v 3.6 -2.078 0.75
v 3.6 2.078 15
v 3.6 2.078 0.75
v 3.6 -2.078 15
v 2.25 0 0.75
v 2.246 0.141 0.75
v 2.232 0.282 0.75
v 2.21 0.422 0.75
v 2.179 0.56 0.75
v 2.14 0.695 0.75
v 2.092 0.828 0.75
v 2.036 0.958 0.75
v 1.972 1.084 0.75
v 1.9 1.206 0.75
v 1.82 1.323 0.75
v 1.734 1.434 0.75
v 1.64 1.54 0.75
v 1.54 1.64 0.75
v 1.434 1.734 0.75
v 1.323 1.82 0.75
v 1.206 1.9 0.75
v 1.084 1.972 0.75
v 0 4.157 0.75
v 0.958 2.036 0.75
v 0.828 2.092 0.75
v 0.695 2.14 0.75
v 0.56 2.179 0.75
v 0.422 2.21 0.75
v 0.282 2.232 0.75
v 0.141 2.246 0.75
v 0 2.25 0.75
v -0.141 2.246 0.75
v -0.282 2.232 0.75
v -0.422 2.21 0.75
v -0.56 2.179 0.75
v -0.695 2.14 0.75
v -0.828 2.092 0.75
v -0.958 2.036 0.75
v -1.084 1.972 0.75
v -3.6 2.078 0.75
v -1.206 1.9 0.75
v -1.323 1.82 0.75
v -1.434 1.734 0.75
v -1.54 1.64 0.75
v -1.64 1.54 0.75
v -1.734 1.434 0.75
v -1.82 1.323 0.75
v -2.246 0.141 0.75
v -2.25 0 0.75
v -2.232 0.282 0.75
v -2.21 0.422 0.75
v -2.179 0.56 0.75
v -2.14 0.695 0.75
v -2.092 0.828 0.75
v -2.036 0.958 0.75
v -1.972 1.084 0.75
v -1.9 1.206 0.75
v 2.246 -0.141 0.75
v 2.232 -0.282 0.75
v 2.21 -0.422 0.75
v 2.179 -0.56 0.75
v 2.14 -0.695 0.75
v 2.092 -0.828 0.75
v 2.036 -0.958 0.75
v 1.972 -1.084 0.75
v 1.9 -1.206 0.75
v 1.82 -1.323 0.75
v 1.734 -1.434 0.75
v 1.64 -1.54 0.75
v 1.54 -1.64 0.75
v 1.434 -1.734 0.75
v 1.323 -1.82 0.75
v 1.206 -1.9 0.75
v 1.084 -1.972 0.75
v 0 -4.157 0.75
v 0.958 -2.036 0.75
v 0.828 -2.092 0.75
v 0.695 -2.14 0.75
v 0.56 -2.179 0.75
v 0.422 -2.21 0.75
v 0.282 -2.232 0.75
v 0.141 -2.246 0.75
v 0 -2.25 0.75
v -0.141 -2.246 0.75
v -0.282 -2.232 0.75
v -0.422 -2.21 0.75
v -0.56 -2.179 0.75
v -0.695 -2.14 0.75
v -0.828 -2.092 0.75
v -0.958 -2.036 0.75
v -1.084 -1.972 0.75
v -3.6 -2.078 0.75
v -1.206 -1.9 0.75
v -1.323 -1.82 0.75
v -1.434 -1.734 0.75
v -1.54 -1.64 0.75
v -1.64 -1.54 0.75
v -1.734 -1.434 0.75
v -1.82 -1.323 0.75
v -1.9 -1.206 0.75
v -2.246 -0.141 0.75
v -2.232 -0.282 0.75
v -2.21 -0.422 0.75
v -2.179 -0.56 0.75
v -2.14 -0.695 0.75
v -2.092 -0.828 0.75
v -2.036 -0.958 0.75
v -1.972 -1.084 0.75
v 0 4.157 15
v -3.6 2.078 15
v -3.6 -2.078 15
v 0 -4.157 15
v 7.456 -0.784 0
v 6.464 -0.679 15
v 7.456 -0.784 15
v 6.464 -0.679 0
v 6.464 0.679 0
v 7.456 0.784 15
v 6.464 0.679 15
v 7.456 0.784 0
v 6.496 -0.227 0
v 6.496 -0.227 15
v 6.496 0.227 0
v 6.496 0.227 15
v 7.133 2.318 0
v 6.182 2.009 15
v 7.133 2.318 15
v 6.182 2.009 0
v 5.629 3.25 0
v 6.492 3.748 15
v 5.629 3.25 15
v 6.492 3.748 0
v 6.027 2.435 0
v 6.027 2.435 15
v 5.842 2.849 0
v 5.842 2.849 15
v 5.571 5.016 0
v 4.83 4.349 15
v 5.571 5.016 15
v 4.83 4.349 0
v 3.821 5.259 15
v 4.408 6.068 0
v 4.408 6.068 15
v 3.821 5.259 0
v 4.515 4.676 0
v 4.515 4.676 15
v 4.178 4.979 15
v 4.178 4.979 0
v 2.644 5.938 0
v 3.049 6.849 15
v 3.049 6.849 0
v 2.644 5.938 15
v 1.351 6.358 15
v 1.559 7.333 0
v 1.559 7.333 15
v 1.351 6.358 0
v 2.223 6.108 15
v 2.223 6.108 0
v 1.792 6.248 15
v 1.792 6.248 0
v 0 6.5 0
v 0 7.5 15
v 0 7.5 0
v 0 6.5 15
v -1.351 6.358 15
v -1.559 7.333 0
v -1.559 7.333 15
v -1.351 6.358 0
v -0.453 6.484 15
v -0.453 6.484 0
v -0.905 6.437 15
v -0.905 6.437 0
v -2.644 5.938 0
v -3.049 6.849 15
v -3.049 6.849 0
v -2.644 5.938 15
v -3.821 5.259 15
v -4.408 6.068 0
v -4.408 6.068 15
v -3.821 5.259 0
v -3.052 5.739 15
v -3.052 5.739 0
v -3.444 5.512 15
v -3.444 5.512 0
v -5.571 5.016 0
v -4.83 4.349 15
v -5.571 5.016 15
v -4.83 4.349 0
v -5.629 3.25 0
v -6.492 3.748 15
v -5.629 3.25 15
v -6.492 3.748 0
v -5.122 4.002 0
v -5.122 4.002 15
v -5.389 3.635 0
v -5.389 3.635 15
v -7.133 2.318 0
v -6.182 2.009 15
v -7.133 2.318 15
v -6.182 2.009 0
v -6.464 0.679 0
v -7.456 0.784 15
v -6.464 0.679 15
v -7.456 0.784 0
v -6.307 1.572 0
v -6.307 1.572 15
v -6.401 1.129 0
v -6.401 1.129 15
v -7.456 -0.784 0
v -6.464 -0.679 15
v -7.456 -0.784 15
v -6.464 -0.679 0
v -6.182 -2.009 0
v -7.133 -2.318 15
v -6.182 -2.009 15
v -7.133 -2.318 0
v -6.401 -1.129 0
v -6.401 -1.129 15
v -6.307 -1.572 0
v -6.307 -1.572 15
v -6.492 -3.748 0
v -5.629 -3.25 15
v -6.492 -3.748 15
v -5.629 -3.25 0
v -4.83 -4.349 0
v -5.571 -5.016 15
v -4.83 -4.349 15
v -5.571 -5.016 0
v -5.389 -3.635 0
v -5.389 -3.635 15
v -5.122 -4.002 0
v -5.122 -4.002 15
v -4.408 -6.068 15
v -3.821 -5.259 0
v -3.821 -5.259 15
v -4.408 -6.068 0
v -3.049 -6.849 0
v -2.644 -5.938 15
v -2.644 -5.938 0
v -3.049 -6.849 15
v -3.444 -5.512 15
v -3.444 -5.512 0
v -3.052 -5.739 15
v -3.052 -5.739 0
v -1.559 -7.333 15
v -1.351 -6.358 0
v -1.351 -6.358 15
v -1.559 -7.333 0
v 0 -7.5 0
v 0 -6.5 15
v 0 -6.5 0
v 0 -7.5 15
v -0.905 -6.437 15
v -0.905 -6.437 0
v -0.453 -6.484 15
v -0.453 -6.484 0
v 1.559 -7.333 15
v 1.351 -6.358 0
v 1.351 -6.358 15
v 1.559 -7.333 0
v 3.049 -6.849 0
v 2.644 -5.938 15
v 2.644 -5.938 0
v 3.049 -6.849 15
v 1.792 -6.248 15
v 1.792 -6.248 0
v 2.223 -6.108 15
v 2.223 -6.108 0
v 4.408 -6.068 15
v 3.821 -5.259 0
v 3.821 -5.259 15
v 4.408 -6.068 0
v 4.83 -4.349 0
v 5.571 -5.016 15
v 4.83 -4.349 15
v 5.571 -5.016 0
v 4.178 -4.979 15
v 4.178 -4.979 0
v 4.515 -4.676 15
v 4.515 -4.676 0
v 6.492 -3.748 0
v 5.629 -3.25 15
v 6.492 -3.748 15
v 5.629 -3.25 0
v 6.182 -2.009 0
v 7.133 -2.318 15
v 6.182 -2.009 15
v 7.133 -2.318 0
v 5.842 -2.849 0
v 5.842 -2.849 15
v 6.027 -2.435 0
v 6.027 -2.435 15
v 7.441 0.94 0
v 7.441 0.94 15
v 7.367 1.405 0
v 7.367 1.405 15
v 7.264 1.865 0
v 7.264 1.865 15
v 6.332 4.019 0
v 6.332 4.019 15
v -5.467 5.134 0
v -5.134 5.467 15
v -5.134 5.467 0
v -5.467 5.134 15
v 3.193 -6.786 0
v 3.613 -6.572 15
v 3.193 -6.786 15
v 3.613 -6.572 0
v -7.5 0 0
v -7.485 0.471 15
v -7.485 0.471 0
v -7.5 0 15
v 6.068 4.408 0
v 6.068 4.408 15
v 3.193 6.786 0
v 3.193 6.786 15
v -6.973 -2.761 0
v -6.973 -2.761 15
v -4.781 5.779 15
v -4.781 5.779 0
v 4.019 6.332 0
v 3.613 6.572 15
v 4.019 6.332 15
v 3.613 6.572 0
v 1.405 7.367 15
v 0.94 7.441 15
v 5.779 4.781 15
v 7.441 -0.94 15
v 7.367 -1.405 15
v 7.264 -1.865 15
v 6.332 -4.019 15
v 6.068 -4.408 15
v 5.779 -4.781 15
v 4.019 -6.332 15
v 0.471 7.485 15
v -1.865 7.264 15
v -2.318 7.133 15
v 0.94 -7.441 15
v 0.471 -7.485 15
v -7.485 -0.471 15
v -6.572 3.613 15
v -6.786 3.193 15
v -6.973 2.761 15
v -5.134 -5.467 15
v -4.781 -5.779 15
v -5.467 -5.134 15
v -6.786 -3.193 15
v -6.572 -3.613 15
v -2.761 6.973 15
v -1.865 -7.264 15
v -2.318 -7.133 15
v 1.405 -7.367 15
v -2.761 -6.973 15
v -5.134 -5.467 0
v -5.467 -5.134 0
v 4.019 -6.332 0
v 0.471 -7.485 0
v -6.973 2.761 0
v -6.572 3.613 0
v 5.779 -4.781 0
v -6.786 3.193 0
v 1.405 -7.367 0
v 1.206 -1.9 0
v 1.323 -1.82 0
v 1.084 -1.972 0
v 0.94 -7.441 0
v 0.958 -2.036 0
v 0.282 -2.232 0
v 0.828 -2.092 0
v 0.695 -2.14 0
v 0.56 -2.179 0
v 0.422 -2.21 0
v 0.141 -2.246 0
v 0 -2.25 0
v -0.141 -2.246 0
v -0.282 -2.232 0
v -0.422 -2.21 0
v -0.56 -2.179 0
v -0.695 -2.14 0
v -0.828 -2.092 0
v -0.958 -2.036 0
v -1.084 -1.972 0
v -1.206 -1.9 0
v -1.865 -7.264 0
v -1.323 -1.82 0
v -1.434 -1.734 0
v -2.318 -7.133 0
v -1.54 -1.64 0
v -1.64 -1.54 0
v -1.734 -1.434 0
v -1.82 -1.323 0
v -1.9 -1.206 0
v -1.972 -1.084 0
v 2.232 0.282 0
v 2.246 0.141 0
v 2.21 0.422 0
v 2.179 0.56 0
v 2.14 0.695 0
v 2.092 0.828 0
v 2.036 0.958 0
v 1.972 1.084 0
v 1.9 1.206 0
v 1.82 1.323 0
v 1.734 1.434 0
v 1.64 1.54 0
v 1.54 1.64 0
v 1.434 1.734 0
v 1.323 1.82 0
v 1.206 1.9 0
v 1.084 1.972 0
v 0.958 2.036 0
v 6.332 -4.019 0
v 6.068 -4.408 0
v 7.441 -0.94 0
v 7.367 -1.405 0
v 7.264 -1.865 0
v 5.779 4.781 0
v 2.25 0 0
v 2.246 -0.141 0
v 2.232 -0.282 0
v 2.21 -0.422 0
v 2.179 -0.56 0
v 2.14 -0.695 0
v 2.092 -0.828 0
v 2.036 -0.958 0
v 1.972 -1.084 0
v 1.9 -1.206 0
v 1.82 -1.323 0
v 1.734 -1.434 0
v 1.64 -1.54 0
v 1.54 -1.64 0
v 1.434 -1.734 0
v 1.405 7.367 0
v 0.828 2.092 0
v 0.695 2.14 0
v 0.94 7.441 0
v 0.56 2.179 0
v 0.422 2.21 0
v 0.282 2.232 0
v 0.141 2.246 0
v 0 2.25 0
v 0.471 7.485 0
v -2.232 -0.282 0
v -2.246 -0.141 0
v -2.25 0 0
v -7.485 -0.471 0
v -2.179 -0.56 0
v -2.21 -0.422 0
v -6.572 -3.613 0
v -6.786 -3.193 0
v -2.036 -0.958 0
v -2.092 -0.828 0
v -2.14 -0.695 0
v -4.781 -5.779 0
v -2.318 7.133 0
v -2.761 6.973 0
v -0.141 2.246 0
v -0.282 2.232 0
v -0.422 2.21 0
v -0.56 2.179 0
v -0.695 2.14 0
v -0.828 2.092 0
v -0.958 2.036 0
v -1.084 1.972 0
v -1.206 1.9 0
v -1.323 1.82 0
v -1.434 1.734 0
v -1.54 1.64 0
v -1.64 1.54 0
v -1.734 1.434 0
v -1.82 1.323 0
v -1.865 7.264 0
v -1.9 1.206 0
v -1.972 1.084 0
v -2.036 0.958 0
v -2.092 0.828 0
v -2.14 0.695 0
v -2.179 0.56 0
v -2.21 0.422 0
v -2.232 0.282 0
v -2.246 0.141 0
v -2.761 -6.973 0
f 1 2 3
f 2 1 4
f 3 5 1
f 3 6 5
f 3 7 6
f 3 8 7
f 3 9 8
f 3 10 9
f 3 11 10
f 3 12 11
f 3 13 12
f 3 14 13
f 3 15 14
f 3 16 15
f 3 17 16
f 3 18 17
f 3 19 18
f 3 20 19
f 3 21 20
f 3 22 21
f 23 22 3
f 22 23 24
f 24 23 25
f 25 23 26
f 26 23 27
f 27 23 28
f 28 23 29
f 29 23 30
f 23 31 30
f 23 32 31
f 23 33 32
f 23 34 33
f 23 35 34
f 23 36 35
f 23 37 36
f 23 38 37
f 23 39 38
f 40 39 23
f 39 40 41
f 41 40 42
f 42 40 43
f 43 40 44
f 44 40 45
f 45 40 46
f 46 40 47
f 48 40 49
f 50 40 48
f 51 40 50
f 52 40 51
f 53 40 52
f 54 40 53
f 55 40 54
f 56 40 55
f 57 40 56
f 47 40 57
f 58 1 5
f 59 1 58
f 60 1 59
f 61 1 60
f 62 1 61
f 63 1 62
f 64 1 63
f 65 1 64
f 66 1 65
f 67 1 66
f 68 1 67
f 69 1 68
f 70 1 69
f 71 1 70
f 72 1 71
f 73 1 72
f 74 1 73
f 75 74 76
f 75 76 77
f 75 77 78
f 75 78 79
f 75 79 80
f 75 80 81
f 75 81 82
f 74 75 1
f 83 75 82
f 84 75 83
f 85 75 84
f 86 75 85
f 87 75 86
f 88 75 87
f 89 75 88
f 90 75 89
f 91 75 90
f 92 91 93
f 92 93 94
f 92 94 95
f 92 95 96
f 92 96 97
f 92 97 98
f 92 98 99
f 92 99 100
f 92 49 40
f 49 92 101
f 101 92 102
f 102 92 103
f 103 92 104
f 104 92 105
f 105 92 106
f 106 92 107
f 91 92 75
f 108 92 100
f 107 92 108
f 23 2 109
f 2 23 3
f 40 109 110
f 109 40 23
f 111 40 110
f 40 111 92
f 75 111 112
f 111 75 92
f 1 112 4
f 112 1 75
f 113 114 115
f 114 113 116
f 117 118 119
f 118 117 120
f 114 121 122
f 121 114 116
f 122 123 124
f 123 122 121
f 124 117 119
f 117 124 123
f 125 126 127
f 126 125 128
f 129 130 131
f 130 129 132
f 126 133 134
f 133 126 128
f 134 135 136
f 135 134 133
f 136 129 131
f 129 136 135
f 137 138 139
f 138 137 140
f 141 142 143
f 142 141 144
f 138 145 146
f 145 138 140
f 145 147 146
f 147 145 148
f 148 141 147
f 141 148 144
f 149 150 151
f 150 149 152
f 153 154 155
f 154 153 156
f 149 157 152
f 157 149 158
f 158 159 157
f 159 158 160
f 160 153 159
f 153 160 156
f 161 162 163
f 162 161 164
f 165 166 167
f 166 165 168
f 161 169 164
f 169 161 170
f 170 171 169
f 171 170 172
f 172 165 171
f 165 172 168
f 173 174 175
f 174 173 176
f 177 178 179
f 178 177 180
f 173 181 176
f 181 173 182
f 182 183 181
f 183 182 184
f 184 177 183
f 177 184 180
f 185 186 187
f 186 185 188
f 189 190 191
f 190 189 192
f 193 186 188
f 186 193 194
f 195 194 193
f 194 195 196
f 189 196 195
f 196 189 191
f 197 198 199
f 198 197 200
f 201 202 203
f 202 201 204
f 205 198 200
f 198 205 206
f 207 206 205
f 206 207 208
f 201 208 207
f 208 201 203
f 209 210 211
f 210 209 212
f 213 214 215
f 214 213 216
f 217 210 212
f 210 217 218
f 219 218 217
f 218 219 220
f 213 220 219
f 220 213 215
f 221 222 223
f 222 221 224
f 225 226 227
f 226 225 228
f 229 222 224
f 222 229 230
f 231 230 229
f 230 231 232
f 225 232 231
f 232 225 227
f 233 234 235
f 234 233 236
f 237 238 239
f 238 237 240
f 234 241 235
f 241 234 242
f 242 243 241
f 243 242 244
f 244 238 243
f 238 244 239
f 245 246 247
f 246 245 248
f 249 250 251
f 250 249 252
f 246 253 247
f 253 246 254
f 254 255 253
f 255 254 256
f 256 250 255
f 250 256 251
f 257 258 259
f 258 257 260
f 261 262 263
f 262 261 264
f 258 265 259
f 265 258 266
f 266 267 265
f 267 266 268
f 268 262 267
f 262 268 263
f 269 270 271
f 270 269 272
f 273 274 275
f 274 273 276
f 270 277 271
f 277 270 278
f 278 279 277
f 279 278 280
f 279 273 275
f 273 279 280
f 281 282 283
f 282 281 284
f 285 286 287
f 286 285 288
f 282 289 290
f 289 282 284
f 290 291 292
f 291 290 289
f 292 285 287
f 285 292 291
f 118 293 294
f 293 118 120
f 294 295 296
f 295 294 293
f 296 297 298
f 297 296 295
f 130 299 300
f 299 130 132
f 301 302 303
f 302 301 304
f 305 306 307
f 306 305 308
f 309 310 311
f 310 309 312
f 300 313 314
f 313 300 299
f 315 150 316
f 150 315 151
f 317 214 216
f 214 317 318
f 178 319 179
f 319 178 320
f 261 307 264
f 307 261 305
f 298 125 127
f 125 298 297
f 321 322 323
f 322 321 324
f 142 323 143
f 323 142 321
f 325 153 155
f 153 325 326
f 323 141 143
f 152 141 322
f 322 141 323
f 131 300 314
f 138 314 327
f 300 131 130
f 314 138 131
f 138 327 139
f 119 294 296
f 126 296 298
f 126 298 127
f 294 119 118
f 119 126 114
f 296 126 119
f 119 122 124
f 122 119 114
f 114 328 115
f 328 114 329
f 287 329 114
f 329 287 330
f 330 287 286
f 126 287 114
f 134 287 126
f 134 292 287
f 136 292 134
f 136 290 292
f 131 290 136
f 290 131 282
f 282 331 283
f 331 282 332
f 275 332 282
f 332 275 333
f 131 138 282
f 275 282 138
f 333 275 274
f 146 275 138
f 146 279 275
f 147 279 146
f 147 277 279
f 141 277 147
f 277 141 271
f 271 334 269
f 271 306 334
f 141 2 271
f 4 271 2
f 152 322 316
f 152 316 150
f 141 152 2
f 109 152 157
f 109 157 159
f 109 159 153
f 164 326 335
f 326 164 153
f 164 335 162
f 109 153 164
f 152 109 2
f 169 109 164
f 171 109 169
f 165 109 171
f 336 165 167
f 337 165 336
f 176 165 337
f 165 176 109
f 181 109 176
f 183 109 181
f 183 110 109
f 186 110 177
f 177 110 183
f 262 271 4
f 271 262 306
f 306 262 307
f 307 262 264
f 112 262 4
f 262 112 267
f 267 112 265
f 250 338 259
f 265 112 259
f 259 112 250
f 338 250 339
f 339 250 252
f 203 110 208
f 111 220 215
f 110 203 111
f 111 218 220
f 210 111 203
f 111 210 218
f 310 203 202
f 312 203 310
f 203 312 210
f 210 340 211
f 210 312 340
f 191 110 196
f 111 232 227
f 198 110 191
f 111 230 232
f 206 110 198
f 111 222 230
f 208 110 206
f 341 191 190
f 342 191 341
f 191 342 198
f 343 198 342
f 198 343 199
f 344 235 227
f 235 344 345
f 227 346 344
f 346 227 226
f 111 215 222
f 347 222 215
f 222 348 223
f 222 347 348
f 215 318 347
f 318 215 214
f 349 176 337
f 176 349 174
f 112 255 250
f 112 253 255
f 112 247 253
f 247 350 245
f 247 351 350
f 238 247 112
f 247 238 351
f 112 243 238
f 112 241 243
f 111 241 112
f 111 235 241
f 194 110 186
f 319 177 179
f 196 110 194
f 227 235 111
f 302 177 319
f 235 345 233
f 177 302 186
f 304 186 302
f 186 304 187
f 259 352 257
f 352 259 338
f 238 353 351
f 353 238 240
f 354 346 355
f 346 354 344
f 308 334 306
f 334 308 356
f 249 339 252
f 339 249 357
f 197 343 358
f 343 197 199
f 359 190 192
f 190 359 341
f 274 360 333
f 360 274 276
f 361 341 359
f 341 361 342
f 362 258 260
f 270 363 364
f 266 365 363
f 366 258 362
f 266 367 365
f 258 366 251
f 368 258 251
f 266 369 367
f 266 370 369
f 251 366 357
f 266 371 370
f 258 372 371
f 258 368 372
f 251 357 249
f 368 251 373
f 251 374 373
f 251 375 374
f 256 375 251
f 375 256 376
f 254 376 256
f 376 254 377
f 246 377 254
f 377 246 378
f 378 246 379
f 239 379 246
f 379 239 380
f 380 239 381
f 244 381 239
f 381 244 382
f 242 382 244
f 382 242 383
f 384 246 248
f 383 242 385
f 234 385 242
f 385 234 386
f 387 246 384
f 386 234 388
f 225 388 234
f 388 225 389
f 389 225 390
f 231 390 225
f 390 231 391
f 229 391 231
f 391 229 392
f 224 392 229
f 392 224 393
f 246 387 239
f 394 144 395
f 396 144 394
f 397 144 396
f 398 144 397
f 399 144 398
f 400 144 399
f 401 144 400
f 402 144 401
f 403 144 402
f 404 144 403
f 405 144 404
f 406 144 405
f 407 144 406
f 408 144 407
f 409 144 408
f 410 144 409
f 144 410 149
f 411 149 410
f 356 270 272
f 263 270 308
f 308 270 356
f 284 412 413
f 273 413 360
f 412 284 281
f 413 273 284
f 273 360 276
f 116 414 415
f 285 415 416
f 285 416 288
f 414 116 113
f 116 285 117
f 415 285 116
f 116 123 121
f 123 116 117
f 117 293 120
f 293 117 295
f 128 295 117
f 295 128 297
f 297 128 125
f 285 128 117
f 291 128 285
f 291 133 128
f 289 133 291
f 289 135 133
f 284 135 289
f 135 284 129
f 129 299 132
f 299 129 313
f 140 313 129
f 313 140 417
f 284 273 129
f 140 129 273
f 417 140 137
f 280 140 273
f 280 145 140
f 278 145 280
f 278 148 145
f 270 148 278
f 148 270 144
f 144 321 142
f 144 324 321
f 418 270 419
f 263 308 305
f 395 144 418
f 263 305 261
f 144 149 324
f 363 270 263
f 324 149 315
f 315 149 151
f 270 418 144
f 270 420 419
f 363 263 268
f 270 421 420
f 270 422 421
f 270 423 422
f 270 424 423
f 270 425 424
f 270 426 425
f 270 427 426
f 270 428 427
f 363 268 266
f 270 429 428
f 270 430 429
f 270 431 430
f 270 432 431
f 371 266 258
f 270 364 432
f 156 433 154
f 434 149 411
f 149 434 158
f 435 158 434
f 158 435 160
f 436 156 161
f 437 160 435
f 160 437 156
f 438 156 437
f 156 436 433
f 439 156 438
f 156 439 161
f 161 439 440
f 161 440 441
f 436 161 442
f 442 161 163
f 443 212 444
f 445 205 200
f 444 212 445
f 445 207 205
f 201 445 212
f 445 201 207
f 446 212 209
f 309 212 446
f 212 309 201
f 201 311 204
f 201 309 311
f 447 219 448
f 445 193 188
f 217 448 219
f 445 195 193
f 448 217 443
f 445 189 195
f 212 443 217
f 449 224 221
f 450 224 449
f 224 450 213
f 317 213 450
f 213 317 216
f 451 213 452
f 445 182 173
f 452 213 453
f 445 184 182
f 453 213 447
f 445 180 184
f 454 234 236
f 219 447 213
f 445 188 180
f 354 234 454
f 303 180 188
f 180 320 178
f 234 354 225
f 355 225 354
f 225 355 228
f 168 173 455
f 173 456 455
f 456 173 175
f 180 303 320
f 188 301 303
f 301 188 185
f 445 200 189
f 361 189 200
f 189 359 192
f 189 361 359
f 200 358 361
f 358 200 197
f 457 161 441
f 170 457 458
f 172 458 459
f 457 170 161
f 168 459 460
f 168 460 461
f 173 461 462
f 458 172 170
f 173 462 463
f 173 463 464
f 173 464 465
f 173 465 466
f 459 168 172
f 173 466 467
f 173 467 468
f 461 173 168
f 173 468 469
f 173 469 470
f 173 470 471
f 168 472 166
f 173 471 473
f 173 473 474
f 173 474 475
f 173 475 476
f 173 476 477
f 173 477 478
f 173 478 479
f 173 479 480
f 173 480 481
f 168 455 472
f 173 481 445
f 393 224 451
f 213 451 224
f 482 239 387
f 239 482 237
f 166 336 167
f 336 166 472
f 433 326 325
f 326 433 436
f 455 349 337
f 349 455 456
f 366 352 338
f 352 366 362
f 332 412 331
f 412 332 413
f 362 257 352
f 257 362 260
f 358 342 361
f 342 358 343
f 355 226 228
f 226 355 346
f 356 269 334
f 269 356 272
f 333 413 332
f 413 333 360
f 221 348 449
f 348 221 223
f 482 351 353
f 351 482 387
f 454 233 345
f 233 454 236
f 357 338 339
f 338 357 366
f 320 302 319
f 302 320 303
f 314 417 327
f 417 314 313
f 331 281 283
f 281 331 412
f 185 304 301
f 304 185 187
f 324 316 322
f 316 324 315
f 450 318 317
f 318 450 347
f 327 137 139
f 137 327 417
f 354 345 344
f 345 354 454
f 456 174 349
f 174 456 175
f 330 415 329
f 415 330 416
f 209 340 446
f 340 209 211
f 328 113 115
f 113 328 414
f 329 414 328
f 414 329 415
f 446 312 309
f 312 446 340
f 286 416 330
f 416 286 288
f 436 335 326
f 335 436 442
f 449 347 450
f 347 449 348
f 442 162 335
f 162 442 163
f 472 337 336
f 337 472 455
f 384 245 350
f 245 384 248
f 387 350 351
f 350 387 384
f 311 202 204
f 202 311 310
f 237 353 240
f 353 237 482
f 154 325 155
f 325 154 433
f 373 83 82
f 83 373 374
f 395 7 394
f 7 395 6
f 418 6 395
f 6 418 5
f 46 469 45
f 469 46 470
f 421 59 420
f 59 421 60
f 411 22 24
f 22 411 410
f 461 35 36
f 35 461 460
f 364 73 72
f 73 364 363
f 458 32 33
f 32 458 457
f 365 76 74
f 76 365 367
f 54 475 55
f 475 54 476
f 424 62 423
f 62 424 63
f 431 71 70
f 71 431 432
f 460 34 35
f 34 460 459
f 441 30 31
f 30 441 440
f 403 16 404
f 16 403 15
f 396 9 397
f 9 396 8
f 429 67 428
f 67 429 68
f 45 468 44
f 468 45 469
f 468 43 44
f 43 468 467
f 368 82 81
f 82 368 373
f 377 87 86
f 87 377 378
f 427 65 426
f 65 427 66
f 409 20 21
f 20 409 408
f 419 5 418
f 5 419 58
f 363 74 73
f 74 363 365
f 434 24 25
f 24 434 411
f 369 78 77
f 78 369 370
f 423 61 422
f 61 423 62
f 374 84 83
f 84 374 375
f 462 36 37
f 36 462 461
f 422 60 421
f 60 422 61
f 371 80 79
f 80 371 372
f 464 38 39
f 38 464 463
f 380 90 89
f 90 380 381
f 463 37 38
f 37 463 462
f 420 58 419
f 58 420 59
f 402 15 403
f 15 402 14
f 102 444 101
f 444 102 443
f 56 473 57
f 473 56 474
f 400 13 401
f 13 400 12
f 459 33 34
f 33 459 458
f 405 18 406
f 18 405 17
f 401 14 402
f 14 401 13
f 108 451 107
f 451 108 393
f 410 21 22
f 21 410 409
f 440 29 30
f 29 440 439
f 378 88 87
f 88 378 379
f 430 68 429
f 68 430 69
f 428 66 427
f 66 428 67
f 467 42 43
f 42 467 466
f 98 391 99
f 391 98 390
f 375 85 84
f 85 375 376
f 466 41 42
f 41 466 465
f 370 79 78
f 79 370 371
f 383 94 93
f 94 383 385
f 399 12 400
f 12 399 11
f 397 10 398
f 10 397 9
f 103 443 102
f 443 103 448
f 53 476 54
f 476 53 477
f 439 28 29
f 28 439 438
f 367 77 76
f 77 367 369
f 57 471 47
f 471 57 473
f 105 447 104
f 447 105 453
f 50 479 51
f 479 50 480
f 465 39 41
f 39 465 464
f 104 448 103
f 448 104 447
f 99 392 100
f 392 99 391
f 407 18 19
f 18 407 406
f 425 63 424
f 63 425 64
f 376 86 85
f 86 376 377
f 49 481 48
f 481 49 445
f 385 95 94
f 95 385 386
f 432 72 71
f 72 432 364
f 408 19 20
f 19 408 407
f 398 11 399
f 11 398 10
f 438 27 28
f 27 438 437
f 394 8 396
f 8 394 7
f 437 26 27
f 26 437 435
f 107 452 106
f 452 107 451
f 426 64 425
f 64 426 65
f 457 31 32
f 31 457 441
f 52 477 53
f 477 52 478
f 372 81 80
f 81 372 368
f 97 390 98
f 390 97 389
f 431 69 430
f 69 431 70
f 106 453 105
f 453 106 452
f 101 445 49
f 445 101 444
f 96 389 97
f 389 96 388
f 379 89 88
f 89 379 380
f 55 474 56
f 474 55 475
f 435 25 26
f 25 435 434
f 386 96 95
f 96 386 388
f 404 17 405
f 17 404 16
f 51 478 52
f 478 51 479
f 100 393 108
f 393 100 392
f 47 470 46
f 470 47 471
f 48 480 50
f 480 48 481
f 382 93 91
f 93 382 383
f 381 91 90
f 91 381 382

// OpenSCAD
/*

Simple knurl with ridges.

Example values are from M4.

*/

// Outer diameter of the cap.
input_cap_od=15;

// Height of the cap.
input_cap_h=15;

// Distance from one flat edge of hex to other.  Consider adding a bit for printer over excrusion.
input_hex_w=7.2;

// Diameter of the threaded screw.  Consider adding a bit for printer over excrusion.
input_screw_d=4.5;

// Amount of material the hex will rest on
input_buffer_h=0.75;

// Number of knurled ridges.  This also drives the width of the knurles.
input_knurl_count=15;

// Knurl depth.  Go too far and you eat through the model..
input_knurl_depth=1;

/* [Hidden] */
$fn=100;

difference()
{
    // 1. create basic shape
    cylinder(d=input_cap_od,h=input_cap_h);

    // 2. cut inner hex bit
    sides=6;
    angle=360/sides;

    hex_cube_w=input_hex_w/2*tan(angle/2)*2;

    color("purple")
    translate([0,0,input_buffer_h])
    for (i=[0:sides-1]) {
        rotate([0,0,i*angle])
        translate([input_hex_w/2-hex_cube_w,-hex_cube_w/2,0])
        cube([hex_cube_w,hex_cube_w,input_cap_h]);
    }
    
    // 3. cut threads bit
    cylinder(d=input_screw_d,h=input_buffer_h*4,center=true);
    
    // 4. cut simple knurl
    circumference=2*PI*(input_cap_od);
    
    knurl_xyz=[input_knurl_depth,circumference/(input_knurl_count*5-1),input_cap_h*2];
    knurl_angle=360/(input_knurl_count*2);

    color("green")
    translate([0,0,-1])
    for (i=[0:input_knurl_count-1]) {
        rotate([0,0,2*i*knurl_angle-knurl_angle/2])
        rotate_extrude(angle=knurl_angle,convexity=2)
        translate([input_cap_od/2-input_knurl_depth,0,0])
        square([input_knurl_depth+1,input_cap_h*2]);
    }
}
